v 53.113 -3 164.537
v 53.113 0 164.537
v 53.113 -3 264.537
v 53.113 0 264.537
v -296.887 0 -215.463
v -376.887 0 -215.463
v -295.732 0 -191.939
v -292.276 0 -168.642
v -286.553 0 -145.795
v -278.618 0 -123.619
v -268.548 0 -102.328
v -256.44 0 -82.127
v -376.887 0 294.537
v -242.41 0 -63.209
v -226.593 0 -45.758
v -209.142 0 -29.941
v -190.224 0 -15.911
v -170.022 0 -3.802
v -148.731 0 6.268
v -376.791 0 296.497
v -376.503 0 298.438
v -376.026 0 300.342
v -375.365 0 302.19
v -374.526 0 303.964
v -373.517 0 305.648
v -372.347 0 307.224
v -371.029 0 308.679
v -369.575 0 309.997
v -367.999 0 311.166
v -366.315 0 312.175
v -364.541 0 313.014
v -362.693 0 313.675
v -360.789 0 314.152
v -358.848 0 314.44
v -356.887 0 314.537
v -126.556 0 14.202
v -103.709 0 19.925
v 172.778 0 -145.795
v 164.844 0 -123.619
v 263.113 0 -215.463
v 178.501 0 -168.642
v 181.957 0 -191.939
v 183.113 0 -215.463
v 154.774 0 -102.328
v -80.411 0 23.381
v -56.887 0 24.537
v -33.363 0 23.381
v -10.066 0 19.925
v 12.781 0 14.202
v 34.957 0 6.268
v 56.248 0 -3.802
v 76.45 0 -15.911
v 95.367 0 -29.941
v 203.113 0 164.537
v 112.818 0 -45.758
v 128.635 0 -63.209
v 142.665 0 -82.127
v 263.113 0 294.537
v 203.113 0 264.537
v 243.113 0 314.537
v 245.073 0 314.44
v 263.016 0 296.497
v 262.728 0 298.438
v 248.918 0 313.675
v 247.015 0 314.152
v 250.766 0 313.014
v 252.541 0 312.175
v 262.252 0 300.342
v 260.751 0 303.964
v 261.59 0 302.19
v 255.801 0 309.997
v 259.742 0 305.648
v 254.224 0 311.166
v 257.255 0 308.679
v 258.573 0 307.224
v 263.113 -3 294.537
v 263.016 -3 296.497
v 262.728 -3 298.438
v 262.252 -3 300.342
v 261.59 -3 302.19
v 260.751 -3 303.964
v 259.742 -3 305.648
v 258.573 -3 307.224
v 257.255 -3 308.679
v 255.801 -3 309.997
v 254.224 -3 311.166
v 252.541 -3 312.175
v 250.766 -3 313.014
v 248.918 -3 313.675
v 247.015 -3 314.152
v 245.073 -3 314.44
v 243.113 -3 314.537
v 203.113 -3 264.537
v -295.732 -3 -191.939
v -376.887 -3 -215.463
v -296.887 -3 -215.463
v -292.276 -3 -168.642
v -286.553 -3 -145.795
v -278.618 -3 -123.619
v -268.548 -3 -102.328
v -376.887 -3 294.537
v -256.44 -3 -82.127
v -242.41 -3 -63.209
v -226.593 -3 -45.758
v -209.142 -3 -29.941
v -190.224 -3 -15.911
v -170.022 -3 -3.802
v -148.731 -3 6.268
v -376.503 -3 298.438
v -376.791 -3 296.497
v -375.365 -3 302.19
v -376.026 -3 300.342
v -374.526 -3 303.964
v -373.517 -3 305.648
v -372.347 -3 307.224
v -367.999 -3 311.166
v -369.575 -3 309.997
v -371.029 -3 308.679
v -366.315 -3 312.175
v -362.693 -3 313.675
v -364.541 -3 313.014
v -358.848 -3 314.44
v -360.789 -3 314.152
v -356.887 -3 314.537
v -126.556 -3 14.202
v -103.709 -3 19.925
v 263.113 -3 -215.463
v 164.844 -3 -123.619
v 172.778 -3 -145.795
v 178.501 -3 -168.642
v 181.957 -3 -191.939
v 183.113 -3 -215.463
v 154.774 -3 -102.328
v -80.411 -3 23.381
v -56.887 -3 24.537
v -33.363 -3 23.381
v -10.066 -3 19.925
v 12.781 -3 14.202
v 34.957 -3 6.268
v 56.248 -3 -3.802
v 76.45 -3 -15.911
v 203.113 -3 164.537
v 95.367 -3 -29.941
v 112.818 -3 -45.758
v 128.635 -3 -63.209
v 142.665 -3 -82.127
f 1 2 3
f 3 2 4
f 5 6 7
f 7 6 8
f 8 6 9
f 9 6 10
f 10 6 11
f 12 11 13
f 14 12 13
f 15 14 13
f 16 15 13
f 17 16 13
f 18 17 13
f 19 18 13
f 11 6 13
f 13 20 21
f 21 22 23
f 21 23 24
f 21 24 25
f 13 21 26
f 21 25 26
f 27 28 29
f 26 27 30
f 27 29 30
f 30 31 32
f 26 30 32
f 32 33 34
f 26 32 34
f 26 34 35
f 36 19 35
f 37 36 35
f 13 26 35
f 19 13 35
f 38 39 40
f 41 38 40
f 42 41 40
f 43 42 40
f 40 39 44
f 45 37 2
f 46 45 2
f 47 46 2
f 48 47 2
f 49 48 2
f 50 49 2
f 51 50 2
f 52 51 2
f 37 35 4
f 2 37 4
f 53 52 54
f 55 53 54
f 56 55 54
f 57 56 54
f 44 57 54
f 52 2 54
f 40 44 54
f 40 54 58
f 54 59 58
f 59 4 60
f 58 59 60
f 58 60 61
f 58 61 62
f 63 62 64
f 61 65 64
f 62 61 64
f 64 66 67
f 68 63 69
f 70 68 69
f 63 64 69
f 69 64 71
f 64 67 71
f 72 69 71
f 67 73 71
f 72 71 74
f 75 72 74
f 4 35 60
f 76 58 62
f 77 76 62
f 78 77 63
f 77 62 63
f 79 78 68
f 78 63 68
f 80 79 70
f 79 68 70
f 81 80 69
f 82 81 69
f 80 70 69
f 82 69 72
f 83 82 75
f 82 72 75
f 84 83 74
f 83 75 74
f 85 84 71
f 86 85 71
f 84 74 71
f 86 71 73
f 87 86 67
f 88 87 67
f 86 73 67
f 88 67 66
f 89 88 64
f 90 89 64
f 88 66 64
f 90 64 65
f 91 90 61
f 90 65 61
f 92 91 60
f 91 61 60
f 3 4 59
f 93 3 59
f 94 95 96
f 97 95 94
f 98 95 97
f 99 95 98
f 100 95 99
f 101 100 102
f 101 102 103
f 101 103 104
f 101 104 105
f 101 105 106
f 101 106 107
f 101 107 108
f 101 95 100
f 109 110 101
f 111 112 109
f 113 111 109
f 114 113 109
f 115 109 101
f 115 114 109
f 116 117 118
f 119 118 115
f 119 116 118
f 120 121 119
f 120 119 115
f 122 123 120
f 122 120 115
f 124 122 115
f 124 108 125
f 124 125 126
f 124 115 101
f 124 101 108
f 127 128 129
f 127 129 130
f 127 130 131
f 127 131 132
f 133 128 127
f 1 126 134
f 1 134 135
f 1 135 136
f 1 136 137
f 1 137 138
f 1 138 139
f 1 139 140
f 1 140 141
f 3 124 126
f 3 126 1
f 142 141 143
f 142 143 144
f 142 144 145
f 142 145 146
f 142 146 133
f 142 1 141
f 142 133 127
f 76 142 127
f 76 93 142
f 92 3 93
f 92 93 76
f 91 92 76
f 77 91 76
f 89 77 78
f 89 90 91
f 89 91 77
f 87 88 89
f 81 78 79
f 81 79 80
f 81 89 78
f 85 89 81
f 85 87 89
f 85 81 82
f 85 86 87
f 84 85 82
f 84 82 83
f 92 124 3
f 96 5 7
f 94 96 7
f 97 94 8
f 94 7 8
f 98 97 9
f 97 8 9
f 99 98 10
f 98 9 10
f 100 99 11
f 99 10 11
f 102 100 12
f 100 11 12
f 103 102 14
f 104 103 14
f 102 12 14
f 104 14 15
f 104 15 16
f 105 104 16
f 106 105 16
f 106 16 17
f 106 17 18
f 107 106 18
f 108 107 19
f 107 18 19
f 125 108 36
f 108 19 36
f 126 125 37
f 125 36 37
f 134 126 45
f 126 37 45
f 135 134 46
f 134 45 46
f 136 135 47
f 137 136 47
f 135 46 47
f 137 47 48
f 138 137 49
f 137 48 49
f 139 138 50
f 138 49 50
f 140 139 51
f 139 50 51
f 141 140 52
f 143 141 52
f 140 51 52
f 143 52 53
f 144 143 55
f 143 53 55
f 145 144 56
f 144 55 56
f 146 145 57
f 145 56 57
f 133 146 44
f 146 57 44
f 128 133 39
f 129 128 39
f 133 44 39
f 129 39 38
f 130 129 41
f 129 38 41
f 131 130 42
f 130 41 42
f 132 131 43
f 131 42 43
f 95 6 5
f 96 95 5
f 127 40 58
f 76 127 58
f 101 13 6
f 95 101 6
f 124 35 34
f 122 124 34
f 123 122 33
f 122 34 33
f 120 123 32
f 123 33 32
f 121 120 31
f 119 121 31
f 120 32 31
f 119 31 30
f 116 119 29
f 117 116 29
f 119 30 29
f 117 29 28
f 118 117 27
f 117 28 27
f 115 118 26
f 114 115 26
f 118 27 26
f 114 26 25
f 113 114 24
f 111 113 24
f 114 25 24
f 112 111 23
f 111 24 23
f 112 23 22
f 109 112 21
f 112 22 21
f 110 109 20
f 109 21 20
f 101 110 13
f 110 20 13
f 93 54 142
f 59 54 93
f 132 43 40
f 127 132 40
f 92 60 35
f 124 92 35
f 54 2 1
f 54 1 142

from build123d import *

# Parameters (mm, degrees)
F0_W     = 150
F0_H     = 100
F1_DEPTH = 3


with BuildPart() as f1:
    # F0 (on Front) → F1 (new body)
    with BuildSketch(Plane.XZ):
        with BuildLine():
            Line((243.11273, 314.536521), (-356.88727, 314.536521))
            ThreePointArc((-356.88727, 314.536521), (-371.029405, 308.678657), (-376.88727, 294.536521))
            Line((-376.88727, 294.536521), (-376.88727, -215.463479))
            Line((-376.88727, -215.463479), (-296.88727, -215.463479))
            ThreePointArc((-296.88727, -215.463479), (-56.88727, 24.536521), (183.11273, -215.463479))
            Line((183.11273, -215.463479), (263.11273, -215.463479))
            Line((263.11273, -215.463479), (263.11273, 294.536521))
            ThreePointArc((263.11273, 294.536521), (257.254866, 308.678657), (243.11273, 314.536521))
        make_face()
        with Locations((128.11273, 214.536521)):
            Rectangle(F0_W, F0_H, mode=Mode.SUBTRACT)
    extrude(amount=F1_DEPTH)


solid = f1.part
